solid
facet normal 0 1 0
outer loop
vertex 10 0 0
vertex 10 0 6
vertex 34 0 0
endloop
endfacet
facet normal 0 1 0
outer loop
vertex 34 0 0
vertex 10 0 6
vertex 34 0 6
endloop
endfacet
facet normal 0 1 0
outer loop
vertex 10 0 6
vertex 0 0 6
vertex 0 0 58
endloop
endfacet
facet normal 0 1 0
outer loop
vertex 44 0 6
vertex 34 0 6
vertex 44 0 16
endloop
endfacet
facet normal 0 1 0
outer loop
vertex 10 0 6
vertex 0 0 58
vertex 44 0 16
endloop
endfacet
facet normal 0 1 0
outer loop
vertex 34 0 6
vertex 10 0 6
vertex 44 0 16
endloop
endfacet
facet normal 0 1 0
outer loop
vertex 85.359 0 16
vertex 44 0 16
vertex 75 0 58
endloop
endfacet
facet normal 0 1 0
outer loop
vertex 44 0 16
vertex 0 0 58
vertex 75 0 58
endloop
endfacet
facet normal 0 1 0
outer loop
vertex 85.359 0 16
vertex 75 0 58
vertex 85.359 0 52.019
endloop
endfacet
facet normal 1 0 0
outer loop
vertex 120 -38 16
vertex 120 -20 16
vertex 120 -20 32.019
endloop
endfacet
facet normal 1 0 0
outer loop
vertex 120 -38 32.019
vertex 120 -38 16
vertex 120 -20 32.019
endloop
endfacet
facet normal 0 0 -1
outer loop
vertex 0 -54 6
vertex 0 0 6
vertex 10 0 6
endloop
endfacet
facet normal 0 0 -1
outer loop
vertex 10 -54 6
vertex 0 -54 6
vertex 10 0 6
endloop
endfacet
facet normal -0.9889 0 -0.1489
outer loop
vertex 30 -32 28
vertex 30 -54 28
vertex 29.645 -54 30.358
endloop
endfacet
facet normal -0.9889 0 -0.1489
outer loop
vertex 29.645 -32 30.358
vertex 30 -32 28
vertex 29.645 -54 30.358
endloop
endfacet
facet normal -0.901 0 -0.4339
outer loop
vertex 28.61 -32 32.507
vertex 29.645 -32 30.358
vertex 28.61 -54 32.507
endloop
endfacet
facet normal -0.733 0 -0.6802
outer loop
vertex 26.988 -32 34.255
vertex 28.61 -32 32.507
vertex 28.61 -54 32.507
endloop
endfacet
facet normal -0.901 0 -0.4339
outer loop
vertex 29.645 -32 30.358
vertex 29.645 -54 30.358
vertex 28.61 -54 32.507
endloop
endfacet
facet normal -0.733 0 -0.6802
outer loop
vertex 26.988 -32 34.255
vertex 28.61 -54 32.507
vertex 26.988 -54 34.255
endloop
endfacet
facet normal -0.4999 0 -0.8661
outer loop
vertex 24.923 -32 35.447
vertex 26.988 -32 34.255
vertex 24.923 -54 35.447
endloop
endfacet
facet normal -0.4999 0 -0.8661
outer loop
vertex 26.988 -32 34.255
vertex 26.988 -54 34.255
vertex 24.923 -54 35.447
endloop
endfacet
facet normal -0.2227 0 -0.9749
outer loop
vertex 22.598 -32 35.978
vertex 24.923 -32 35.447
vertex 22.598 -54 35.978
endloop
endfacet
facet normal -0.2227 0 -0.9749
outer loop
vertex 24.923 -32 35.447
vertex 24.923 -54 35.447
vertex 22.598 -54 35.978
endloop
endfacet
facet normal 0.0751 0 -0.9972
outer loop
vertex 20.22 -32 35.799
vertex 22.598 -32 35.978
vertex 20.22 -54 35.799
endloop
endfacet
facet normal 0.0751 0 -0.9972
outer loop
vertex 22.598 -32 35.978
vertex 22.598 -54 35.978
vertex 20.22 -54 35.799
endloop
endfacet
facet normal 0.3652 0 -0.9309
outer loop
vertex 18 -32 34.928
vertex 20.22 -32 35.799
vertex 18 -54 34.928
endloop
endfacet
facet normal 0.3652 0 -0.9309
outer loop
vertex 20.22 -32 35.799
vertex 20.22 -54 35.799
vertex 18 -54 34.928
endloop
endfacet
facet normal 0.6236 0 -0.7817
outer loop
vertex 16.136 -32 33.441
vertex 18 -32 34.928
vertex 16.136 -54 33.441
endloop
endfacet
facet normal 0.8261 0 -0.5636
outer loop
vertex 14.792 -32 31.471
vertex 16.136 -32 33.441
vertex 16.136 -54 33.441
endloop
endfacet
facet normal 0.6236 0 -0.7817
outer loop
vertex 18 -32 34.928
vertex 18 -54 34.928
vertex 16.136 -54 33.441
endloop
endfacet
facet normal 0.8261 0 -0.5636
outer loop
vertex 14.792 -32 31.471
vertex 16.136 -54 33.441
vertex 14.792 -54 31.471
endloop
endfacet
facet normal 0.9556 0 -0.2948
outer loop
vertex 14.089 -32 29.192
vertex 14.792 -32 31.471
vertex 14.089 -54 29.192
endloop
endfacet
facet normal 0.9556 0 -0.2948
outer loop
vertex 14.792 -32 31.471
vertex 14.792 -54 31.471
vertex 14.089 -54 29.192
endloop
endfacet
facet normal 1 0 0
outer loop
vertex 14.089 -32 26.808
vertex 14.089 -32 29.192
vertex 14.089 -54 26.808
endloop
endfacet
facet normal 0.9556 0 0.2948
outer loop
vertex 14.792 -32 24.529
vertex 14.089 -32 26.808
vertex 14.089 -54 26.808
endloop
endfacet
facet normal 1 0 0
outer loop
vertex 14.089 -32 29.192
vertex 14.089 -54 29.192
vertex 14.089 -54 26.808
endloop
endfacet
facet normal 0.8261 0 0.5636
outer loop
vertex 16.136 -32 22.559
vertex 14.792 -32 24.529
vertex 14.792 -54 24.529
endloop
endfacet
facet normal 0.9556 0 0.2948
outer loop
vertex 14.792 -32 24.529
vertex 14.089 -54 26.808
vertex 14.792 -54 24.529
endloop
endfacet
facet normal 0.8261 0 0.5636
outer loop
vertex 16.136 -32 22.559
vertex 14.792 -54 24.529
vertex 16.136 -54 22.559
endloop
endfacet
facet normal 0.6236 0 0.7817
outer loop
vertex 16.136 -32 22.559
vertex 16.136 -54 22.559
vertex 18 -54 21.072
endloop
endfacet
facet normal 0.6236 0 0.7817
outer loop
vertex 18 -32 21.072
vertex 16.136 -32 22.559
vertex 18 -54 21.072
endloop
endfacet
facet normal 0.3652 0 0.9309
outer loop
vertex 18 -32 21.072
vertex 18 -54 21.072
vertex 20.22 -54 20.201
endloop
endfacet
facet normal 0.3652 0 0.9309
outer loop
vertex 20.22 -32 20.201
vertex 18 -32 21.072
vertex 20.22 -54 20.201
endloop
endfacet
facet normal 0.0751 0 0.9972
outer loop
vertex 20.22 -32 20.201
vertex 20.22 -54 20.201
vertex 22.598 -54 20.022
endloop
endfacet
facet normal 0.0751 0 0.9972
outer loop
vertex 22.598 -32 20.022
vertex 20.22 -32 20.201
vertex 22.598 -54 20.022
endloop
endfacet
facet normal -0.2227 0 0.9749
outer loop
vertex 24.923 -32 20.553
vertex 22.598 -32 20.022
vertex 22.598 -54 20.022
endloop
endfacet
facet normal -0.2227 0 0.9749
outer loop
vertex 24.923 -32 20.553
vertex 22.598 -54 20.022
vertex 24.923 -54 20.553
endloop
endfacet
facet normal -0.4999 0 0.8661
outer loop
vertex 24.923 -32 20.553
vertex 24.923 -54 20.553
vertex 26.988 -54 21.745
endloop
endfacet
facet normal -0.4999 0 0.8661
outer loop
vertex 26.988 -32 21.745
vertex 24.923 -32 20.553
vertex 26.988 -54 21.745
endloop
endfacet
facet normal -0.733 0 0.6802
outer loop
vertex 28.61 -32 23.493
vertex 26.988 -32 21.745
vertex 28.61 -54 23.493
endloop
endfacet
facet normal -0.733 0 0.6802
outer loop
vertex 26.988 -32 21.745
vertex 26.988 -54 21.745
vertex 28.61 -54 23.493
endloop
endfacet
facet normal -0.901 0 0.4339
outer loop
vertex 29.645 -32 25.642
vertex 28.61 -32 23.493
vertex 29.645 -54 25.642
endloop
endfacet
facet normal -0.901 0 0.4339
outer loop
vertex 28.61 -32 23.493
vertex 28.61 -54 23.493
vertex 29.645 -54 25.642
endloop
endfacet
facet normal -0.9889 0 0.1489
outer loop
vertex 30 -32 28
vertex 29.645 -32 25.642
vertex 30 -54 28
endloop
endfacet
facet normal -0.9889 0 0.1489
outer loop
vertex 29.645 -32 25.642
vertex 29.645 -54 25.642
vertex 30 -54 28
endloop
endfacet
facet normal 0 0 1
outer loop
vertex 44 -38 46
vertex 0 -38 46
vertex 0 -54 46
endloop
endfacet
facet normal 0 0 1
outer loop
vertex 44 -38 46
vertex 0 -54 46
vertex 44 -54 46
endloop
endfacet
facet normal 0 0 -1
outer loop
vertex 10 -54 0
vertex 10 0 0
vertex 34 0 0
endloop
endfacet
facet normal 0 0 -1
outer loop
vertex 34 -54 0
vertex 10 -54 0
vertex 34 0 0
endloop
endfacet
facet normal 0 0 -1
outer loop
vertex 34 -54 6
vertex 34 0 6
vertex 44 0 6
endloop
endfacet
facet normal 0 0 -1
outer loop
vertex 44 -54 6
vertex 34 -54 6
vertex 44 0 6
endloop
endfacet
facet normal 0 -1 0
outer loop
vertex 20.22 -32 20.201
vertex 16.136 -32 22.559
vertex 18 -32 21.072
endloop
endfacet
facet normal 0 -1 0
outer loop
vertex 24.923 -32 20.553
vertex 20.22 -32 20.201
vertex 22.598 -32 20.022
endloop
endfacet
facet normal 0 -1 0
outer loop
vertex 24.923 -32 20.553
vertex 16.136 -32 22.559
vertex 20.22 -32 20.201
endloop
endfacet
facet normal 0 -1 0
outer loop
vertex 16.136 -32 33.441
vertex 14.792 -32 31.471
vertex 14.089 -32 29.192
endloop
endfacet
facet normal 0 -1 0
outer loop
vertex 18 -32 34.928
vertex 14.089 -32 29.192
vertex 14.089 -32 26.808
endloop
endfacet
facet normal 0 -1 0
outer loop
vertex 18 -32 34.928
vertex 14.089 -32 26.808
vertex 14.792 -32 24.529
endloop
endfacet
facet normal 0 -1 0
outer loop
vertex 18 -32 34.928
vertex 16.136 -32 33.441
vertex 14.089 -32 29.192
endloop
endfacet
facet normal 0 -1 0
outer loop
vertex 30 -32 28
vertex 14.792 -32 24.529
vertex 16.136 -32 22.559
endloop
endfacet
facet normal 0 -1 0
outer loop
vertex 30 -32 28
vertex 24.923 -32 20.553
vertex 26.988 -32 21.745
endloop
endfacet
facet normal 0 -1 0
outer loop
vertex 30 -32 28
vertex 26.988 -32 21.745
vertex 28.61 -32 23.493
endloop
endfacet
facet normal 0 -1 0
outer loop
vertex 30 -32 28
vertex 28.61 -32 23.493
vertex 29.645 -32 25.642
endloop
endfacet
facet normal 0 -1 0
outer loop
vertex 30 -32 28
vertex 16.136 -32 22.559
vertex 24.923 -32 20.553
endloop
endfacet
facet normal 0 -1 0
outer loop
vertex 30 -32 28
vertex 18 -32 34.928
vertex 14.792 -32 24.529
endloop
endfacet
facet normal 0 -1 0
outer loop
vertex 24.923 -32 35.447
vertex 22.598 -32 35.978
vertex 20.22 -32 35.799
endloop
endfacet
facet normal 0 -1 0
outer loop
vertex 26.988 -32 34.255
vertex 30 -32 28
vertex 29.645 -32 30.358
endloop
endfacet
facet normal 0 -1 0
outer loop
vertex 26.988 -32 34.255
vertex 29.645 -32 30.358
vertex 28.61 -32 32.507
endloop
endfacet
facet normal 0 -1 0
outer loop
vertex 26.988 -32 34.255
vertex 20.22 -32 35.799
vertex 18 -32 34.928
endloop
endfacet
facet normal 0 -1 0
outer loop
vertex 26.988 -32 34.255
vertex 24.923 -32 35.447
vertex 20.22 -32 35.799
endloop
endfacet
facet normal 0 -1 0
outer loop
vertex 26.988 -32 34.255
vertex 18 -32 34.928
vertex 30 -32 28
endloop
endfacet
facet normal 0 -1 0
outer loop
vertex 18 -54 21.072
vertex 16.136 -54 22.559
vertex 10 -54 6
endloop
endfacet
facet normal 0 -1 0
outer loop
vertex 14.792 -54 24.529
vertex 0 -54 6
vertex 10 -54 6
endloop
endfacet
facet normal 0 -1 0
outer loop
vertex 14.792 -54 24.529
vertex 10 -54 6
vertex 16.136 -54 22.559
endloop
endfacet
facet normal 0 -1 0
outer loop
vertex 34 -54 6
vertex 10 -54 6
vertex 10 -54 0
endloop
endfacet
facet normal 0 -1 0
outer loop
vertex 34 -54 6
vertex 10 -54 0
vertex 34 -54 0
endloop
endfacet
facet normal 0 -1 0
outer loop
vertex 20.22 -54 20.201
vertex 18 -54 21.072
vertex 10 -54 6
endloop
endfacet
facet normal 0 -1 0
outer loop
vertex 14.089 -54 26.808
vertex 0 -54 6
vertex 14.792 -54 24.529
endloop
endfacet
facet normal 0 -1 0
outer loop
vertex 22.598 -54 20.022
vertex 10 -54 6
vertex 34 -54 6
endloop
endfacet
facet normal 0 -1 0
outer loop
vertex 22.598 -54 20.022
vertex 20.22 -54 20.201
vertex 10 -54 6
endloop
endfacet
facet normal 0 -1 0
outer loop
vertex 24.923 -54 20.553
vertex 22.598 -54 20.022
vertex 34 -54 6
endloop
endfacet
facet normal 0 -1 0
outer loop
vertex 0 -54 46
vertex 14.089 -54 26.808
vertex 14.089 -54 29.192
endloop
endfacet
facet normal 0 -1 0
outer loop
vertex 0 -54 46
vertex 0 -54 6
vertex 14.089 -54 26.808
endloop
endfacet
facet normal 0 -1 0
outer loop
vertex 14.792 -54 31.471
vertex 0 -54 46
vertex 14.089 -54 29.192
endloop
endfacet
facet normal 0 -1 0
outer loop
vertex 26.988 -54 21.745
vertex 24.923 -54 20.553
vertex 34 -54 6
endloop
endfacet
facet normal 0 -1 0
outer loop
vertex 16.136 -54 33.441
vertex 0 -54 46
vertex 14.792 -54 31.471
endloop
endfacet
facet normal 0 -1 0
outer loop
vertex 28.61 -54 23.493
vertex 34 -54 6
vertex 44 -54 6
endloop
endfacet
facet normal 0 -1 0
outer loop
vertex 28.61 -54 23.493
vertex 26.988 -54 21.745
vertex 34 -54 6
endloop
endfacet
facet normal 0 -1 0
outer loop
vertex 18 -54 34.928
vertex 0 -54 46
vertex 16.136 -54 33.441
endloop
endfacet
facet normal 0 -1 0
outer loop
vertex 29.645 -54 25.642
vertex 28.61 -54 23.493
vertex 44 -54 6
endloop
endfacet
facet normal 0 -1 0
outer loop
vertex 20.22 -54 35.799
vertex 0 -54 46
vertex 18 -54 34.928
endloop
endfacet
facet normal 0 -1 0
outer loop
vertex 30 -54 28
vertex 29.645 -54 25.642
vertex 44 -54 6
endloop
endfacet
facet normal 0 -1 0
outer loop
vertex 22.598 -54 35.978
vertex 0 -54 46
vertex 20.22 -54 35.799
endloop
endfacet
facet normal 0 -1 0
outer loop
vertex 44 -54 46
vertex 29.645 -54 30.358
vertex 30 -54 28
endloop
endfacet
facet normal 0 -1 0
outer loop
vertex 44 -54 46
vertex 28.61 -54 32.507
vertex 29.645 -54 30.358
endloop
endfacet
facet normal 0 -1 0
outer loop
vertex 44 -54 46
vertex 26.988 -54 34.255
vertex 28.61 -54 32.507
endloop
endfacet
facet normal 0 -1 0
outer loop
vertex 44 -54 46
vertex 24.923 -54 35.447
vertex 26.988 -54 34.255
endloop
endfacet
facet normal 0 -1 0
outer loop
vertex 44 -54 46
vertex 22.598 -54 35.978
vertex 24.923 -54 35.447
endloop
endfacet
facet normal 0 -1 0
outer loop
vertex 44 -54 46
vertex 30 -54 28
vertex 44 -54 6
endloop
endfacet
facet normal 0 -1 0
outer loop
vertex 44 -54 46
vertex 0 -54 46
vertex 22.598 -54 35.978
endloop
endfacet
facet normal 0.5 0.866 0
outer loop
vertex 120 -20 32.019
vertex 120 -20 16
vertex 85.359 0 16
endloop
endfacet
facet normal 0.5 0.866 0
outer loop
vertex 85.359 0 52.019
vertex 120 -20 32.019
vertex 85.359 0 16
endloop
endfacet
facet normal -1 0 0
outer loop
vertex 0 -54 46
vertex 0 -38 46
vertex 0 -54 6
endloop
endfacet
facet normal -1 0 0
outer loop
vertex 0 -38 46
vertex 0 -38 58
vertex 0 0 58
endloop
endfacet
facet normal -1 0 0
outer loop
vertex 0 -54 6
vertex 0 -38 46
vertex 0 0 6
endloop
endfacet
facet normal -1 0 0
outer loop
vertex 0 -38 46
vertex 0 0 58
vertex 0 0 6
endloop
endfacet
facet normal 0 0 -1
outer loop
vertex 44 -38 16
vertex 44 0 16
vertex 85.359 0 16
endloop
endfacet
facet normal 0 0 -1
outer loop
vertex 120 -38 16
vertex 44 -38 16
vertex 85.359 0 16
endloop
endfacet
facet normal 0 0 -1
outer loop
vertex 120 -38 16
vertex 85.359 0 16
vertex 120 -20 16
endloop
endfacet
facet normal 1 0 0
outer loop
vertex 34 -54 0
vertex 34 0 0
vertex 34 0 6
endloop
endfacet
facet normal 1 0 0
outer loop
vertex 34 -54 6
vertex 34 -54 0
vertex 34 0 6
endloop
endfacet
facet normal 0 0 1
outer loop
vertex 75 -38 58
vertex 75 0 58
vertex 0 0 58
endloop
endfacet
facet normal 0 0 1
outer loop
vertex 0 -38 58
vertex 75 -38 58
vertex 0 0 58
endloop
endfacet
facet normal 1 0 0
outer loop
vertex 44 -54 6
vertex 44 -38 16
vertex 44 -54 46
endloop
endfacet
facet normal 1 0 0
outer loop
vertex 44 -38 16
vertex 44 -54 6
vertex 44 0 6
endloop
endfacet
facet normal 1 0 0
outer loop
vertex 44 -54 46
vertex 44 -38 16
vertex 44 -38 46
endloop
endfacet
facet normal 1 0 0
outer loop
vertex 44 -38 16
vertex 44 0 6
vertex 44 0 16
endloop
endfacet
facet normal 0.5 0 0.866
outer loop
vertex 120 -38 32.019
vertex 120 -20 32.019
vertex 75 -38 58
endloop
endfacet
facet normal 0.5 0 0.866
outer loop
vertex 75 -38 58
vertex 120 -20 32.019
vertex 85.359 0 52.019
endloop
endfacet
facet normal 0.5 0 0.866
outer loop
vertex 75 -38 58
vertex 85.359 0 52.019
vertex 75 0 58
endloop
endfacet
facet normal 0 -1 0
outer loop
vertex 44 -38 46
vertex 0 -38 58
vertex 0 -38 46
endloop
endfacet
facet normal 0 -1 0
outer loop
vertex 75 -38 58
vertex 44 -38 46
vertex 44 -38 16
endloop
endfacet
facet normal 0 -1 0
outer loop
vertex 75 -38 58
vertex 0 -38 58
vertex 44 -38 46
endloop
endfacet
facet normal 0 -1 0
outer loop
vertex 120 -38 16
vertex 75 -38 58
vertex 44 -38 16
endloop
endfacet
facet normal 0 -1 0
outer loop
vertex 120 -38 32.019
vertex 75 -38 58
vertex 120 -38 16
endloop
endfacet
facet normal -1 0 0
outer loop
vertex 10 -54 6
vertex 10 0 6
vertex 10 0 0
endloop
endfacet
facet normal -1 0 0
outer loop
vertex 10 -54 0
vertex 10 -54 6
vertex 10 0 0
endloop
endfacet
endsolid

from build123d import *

# Parameters (mm, degrees)
F0_W     = 44
F0_H     = 30
F0_R     = 8
F1_DEPTH = 54
F2_DEPTH = 38
F3_R     = 8
F4_DEPTH = 22
F6_DEPTH = 42.001


with BuildPart() as f1:
    # F0 (on Front) → F1 (new body)
    with BuildSketch(Plane.XZ):
        Polygon((0, 16), (0, 6), (10, 6), (10, 0), (34, 0), (34, 6), (44, 6), (44, 16), align=None)
        with Locations((22, 31)):
            Rectangle(F0_W, F0_H)
        with Locations((22, 28)):
            Circle(F0_R, mode=Mode.SUBTRACT)
        with Locations((22, 28)):
            Circle(F0_R)
    extrude(amount=F1_DEPTH)

    # F0 (on Front) → F2 (join)
    with BuildSketch(Plane.XZ):
        Polygon((0, 58), (0, 46), (44, 46), (44, 16), (120, 16), (120, 32.019238), (75, 58), align=None)
    extrude(amount=F2_DEPTH)

    # F3 (on face) → F4 (cut)
    with BuildSketch(Plane.XZ.offset(54)):
        with Locations((22, 28)):
            Circle(F3_R)
    extrude(amount=-F4_DEPTH, mode=Mode.SUBTRACT)

    # F5 (on face) → F6 (cut, through all)
    with BuildSketch(Plane(origin=(0, 0, 16), x_dir=(1, 0, 0), z_dir=(0, 0, -1))):
        Polygon((85.358984, 0), (120, 0), (120, 20), align=None)
    extrude(amount=-F6_DEPTH, mode=Mode.SUBTRACT)


solid = f1.part
